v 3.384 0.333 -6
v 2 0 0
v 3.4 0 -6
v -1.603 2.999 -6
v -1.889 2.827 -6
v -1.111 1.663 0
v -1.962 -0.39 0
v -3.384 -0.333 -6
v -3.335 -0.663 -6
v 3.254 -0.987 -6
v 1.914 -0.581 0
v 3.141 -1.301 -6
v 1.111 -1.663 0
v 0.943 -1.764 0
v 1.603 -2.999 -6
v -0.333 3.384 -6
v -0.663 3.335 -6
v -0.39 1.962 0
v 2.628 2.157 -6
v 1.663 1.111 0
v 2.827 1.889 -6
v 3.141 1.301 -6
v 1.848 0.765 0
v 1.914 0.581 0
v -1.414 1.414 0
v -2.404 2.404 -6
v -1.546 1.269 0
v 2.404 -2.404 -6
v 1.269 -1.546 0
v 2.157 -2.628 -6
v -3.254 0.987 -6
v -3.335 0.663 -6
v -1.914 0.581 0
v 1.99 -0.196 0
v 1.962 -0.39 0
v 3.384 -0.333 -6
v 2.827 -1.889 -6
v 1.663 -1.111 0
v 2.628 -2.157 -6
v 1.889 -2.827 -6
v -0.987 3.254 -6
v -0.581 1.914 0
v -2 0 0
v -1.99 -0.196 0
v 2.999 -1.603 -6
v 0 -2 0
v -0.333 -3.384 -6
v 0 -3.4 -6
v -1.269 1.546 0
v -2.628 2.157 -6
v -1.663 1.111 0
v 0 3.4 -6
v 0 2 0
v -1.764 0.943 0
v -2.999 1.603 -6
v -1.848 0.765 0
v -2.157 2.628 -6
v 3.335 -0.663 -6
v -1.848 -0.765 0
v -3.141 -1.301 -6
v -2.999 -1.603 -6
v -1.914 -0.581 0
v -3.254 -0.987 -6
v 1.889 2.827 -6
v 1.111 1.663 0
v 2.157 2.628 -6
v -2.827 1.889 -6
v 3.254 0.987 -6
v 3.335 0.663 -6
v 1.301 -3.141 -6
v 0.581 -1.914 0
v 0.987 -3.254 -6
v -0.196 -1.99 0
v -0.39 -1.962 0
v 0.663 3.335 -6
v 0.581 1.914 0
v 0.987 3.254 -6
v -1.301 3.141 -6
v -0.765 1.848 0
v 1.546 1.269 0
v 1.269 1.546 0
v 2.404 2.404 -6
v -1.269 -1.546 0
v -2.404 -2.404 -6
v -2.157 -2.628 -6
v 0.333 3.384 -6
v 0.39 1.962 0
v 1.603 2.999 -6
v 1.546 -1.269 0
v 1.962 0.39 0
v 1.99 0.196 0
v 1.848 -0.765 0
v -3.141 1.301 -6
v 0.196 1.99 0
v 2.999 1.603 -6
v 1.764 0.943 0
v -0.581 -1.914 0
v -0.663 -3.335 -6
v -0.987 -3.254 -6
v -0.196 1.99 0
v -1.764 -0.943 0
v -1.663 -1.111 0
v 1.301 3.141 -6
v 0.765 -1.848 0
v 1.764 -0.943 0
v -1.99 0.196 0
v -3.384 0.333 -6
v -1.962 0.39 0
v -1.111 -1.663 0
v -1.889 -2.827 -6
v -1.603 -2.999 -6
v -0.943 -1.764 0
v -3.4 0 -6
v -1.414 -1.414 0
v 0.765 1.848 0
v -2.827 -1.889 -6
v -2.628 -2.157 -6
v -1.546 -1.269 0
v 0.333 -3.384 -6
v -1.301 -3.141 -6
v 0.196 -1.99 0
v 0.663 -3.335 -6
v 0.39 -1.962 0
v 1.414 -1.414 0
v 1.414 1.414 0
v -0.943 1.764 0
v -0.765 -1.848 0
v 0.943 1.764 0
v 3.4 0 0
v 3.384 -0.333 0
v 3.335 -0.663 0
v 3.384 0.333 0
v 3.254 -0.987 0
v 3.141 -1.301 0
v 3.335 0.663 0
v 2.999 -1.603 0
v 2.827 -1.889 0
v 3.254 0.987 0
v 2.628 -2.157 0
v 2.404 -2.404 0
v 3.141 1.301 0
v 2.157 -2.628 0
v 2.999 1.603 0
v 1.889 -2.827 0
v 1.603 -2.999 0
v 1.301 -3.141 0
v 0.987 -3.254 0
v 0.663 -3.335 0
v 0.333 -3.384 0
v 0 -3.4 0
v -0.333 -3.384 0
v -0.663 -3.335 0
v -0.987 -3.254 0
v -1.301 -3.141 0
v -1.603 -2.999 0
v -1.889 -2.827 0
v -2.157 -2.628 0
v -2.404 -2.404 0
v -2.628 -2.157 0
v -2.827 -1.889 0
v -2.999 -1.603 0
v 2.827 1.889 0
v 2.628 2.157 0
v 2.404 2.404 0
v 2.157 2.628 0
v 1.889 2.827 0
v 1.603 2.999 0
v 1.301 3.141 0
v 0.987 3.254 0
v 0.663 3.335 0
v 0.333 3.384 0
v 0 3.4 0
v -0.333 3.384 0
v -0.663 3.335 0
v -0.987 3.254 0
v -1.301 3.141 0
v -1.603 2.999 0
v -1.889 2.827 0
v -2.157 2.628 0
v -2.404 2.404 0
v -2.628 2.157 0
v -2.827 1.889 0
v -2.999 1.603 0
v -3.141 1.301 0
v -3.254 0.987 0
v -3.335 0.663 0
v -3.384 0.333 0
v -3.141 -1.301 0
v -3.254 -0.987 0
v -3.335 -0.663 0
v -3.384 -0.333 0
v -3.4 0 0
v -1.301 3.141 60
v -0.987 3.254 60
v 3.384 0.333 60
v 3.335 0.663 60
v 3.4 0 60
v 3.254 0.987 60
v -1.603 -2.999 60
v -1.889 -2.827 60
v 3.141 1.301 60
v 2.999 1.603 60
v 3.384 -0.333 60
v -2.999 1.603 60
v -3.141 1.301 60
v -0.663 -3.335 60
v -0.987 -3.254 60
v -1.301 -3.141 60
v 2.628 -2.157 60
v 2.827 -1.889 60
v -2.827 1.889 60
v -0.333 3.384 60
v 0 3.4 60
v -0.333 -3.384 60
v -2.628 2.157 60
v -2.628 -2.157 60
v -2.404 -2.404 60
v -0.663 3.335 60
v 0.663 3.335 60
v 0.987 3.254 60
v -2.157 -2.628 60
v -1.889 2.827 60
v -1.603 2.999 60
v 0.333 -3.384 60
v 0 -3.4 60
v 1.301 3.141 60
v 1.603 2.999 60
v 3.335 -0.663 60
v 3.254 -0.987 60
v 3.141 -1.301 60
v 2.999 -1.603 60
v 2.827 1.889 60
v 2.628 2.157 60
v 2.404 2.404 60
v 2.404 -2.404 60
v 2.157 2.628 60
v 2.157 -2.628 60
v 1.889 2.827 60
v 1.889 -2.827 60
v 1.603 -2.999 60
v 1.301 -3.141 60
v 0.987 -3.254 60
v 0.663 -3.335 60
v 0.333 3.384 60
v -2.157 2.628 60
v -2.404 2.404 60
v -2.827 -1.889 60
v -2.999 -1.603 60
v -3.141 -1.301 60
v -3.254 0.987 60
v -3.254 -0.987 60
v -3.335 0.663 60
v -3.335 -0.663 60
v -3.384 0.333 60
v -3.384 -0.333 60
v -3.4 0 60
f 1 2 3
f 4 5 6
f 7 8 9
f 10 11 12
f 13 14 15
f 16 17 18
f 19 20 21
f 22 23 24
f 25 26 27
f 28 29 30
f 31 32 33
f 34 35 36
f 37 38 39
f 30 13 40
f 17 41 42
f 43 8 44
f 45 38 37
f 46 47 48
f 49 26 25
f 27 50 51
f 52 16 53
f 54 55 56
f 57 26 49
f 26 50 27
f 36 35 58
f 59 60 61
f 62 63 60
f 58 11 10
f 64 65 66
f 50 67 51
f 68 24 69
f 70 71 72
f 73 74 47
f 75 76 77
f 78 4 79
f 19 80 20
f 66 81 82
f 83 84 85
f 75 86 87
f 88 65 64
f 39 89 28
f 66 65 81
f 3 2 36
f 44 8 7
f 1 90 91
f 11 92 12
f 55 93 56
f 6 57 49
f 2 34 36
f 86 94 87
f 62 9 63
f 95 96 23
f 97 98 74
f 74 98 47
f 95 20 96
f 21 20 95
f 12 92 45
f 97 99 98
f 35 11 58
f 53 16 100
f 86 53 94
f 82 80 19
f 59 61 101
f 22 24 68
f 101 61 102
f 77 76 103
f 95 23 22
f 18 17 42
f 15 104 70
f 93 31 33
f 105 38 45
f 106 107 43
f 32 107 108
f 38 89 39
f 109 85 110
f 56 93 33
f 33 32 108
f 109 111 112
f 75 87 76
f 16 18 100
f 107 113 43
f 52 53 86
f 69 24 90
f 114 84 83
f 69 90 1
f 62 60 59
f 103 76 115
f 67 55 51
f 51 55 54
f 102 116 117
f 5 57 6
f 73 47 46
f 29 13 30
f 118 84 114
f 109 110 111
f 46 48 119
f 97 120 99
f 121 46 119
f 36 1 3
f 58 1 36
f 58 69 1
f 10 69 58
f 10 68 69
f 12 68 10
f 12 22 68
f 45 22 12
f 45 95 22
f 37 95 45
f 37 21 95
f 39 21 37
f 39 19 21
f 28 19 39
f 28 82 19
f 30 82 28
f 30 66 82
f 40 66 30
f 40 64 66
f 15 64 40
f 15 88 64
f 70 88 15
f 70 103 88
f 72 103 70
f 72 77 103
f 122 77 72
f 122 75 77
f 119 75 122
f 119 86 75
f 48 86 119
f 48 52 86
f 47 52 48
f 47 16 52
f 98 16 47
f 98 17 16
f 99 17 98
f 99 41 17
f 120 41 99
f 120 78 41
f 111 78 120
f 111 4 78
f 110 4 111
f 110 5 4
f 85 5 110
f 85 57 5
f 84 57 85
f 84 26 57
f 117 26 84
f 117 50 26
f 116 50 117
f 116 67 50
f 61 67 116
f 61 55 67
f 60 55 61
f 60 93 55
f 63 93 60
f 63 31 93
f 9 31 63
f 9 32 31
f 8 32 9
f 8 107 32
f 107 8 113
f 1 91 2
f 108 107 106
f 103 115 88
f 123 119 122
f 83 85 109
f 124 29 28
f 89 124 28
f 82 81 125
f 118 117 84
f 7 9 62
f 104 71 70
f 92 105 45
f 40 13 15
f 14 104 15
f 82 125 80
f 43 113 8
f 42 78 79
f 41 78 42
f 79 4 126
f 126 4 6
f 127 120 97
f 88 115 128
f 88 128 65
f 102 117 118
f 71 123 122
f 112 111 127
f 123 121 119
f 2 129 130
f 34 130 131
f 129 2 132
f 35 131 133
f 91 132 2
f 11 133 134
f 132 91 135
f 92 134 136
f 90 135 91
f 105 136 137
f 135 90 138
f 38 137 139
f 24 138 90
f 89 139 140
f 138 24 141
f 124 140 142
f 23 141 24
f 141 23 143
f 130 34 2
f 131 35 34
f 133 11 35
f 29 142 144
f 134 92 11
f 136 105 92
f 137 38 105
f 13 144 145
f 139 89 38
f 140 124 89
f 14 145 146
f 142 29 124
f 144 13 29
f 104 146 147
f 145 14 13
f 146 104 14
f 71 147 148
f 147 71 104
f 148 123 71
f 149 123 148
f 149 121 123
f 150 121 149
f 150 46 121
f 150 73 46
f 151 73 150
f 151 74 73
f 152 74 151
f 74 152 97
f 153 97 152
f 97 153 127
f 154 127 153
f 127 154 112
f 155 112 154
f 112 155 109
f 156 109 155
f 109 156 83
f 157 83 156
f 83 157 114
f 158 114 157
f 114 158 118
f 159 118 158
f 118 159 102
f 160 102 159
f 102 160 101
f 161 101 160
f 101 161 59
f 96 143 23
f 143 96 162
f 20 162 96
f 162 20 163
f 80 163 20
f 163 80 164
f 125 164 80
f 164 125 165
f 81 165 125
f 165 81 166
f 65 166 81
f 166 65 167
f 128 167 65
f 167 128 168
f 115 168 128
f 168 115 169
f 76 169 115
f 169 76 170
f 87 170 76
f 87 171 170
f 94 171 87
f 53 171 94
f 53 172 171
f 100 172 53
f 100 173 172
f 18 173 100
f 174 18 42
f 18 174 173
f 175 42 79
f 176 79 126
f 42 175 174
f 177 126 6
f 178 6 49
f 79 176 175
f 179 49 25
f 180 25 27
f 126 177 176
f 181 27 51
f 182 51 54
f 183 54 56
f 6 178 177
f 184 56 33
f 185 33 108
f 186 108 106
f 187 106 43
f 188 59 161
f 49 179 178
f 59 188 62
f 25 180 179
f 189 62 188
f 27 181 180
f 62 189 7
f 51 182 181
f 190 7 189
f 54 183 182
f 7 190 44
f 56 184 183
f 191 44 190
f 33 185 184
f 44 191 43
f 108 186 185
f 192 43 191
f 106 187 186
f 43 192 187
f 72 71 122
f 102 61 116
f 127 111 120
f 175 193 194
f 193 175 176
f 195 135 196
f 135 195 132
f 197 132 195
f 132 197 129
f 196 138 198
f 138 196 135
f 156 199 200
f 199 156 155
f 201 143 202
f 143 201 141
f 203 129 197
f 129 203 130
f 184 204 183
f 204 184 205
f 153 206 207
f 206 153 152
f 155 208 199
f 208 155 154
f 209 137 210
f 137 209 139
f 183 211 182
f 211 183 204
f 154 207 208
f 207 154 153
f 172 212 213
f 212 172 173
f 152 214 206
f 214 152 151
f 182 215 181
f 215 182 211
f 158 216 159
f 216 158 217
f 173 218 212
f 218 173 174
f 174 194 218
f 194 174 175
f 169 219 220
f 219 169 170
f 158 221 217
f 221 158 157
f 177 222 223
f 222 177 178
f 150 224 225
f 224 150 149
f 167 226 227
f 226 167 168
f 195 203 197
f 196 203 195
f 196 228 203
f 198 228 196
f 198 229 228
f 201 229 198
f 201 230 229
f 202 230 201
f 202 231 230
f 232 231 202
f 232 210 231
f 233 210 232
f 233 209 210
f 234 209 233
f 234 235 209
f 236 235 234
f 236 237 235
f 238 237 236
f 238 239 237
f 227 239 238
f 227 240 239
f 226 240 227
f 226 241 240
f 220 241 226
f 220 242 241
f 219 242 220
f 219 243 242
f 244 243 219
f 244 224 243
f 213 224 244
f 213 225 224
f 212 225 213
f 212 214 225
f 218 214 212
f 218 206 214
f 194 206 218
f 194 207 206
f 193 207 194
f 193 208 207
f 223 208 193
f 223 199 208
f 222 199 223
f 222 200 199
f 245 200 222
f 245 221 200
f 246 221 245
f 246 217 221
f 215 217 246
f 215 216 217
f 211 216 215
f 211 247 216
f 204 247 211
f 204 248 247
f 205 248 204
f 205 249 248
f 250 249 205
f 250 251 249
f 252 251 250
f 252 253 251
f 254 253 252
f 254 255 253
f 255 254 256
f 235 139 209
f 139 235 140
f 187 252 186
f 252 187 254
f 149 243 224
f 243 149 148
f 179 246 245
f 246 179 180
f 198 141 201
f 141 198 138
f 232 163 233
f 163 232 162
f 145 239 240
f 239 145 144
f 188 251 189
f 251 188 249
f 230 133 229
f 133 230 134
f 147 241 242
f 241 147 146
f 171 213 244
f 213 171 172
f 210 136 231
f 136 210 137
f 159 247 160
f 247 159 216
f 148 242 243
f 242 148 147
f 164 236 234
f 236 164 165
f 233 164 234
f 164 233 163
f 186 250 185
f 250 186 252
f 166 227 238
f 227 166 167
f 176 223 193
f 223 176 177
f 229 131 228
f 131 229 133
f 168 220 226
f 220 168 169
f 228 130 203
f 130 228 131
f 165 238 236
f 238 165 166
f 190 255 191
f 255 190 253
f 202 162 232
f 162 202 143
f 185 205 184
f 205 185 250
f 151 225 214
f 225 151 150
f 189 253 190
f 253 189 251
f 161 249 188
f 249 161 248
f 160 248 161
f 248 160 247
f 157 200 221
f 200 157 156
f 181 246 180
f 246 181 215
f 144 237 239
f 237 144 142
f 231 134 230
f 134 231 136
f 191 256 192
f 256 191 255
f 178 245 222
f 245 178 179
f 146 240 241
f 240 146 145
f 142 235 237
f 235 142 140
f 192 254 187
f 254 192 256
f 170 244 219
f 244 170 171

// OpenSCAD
module hot_end() {
    union() {
        // Nozzle
        translate([0, 0, -6])
            cylinder(h=6, d1=6.8, d2=4, $fn=64);
        
        // Barrel
        translate([0, 0, 0])
            cylinder(h=60, d=6.8, $fn=64);
        
        // Filament path
        translate([0, 0, -6])
            cylinder(h=66, d=1.75, $fn=64);
    }
}

hot_end();
